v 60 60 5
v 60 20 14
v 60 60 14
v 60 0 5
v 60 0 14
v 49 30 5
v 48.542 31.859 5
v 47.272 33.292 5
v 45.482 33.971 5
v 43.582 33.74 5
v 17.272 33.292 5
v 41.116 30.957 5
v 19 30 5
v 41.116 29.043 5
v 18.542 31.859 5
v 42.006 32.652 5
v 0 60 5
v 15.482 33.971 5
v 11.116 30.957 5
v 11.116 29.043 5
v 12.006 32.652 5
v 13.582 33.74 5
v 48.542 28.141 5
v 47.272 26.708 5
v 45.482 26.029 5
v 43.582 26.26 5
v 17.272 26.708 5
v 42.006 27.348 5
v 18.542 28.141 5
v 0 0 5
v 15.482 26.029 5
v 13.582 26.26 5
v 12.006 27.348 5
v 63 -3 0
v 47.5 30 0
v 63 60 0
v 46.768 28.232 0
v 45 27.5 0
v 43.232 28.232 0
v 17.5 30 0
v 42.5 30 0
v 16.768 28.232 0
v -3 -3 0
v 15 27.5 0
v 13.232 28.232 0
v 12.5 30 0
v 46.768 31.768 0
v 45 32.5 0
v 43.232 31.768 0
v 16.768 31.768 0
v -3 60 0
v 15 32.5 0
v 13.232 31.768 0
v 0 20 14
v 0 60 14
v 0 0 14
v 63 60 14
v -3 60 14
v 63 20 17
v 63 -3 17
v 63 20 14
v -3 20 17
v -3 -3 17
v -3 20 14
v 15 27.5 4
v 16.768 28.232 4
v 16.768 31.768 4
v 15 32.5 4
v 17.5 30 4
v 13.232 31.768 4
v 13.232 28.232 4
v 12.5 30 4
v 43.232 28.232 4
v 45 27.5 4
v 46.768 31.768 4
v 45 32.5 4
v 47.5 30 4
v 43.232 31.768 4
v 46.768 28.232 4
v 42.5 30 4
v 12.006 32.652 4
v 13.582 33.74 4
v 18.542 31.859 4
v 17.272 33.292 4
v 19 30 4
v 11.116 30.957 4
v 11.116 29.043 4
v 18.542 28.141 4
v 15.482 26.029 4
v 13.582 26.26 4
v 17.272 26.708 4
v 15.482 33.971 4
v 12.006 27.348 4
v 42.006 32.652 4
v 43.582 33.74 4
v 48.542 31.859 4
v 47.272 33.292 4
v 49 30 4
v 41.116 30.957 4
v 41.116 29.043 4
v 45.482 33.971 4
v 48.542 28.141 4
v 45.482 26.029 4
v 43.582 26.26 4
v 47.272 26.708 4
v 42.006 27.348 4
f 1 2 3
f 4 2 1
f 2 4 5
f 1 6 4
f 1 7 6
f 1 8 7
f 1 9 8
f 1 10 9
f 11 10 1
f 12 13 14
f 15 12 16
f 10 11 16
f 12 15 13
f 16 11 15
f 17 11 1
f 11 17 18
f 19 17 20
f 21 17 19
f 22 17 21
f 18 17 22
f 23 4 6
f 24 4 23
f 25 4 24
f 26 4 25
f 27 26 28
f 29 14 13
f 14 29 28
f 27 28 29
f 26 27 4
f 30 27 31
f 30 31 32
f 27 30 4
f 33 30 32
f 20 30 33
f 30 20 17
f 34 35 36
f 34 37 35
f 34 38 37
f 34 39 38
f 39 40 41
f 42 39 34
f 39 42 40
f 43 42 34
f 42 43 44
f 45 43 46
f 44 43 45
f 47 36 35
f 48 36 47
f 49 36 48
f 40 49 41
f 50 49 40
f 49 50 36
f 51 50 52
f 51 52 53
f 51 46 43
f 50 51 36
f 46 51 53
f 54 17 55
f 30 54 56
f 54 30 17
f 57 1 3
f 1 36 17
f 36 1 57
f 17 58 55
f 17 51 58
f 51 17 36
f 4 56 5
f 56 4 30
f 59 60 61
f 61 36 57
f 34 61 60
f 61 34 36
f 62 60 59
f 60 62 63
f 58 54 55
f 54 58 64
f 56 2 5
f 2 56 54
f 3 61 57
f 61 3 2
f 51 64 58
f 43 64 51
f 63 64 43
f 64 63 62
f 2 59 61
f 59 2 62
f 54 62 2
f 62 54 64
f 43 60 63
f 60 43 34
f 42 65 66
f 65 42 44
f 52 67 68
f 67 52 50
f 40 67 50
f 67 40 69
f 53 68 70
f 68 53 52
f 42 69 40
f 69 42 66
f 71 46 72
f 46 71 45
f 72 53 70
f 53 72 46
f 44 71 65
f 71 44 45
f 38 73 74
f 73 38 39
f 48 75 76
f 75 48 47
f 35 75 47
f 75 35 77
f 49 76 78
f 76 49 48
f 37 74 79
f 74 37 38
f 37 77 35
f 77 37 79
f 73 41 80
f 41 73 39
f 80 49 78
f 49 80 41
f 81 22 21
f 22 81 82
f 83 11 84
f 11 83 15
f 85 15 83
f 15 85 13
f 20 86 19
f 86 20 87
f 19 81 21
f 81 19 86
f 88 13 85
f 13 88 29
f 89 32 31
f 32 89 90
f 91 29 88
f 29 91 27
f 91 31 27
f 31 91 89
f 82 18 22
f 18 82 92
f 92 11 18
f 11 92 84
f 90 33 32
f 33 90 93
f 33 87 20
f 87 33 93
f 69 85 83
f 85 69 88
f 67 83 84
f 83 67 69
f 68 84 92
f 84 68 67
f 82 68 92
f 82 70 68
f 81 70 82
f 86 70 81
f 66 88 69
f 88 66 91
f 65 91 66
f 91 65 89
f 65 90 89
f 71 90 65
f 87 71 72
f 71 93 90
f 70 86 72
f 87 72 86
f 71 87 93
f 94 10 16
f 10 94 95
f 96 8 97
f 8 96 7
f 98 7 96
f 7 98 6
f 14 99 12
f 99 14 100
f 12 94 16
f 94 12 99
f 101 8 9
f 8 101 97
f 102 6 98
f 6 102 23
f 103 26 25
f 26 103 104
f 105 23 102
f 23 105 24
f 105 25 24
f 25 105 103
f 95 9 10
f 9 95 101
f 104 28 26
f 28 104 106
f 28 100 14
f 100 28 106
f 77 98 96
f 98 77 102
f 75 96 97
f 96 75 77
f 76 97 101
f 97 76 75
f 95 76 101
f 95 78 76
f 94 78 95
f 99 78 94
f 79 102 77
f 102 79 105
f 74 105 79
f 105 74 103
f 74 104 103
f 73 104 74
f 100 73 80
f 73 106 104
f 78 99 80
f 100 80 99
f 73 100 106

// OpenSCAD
// The length of the backplate of the mount
backplateHeight = 60;

// The width of the backplate of the mount, exluding the sides
backplateWidth = 60;

// The height of the front plate
frontPlateHeight = 20;

// The thickness of the phone
phoneThickness = 9;

module plate(){
	cube([backplateWidth, backplateHeight, 5]);
	translate([-3, -3, 5 + phoneThickness]) cube([backplateWidth + 6, frontPlateHeight + 3, 3]);
	translate([-3, -3, 0]) cube([backplateWidth + 6, 3, phoneThickness + 5]);
	translate([backplateWidth, 0, 0]) cube([3, backplateHeight, 14]);
	translate([-3, 0, 0]) cube([3, backplateHeight, 14]);
}

difference() {
	plate();
	translate([(backplateWidth/4), 30, -2]) cylinder(r = 2.5, h = 12);
	translate([3*(backplateWidth/4), 30, -2]) cylinder(r = 2.5, h = 12);
	translate([(backplateWidth/4), 30, 4]) cylinder(r = 4, h = 2);
	translate([3*(backplateWidth/4), 30, 4]) cylinder(r = 4, h = 2);
}
